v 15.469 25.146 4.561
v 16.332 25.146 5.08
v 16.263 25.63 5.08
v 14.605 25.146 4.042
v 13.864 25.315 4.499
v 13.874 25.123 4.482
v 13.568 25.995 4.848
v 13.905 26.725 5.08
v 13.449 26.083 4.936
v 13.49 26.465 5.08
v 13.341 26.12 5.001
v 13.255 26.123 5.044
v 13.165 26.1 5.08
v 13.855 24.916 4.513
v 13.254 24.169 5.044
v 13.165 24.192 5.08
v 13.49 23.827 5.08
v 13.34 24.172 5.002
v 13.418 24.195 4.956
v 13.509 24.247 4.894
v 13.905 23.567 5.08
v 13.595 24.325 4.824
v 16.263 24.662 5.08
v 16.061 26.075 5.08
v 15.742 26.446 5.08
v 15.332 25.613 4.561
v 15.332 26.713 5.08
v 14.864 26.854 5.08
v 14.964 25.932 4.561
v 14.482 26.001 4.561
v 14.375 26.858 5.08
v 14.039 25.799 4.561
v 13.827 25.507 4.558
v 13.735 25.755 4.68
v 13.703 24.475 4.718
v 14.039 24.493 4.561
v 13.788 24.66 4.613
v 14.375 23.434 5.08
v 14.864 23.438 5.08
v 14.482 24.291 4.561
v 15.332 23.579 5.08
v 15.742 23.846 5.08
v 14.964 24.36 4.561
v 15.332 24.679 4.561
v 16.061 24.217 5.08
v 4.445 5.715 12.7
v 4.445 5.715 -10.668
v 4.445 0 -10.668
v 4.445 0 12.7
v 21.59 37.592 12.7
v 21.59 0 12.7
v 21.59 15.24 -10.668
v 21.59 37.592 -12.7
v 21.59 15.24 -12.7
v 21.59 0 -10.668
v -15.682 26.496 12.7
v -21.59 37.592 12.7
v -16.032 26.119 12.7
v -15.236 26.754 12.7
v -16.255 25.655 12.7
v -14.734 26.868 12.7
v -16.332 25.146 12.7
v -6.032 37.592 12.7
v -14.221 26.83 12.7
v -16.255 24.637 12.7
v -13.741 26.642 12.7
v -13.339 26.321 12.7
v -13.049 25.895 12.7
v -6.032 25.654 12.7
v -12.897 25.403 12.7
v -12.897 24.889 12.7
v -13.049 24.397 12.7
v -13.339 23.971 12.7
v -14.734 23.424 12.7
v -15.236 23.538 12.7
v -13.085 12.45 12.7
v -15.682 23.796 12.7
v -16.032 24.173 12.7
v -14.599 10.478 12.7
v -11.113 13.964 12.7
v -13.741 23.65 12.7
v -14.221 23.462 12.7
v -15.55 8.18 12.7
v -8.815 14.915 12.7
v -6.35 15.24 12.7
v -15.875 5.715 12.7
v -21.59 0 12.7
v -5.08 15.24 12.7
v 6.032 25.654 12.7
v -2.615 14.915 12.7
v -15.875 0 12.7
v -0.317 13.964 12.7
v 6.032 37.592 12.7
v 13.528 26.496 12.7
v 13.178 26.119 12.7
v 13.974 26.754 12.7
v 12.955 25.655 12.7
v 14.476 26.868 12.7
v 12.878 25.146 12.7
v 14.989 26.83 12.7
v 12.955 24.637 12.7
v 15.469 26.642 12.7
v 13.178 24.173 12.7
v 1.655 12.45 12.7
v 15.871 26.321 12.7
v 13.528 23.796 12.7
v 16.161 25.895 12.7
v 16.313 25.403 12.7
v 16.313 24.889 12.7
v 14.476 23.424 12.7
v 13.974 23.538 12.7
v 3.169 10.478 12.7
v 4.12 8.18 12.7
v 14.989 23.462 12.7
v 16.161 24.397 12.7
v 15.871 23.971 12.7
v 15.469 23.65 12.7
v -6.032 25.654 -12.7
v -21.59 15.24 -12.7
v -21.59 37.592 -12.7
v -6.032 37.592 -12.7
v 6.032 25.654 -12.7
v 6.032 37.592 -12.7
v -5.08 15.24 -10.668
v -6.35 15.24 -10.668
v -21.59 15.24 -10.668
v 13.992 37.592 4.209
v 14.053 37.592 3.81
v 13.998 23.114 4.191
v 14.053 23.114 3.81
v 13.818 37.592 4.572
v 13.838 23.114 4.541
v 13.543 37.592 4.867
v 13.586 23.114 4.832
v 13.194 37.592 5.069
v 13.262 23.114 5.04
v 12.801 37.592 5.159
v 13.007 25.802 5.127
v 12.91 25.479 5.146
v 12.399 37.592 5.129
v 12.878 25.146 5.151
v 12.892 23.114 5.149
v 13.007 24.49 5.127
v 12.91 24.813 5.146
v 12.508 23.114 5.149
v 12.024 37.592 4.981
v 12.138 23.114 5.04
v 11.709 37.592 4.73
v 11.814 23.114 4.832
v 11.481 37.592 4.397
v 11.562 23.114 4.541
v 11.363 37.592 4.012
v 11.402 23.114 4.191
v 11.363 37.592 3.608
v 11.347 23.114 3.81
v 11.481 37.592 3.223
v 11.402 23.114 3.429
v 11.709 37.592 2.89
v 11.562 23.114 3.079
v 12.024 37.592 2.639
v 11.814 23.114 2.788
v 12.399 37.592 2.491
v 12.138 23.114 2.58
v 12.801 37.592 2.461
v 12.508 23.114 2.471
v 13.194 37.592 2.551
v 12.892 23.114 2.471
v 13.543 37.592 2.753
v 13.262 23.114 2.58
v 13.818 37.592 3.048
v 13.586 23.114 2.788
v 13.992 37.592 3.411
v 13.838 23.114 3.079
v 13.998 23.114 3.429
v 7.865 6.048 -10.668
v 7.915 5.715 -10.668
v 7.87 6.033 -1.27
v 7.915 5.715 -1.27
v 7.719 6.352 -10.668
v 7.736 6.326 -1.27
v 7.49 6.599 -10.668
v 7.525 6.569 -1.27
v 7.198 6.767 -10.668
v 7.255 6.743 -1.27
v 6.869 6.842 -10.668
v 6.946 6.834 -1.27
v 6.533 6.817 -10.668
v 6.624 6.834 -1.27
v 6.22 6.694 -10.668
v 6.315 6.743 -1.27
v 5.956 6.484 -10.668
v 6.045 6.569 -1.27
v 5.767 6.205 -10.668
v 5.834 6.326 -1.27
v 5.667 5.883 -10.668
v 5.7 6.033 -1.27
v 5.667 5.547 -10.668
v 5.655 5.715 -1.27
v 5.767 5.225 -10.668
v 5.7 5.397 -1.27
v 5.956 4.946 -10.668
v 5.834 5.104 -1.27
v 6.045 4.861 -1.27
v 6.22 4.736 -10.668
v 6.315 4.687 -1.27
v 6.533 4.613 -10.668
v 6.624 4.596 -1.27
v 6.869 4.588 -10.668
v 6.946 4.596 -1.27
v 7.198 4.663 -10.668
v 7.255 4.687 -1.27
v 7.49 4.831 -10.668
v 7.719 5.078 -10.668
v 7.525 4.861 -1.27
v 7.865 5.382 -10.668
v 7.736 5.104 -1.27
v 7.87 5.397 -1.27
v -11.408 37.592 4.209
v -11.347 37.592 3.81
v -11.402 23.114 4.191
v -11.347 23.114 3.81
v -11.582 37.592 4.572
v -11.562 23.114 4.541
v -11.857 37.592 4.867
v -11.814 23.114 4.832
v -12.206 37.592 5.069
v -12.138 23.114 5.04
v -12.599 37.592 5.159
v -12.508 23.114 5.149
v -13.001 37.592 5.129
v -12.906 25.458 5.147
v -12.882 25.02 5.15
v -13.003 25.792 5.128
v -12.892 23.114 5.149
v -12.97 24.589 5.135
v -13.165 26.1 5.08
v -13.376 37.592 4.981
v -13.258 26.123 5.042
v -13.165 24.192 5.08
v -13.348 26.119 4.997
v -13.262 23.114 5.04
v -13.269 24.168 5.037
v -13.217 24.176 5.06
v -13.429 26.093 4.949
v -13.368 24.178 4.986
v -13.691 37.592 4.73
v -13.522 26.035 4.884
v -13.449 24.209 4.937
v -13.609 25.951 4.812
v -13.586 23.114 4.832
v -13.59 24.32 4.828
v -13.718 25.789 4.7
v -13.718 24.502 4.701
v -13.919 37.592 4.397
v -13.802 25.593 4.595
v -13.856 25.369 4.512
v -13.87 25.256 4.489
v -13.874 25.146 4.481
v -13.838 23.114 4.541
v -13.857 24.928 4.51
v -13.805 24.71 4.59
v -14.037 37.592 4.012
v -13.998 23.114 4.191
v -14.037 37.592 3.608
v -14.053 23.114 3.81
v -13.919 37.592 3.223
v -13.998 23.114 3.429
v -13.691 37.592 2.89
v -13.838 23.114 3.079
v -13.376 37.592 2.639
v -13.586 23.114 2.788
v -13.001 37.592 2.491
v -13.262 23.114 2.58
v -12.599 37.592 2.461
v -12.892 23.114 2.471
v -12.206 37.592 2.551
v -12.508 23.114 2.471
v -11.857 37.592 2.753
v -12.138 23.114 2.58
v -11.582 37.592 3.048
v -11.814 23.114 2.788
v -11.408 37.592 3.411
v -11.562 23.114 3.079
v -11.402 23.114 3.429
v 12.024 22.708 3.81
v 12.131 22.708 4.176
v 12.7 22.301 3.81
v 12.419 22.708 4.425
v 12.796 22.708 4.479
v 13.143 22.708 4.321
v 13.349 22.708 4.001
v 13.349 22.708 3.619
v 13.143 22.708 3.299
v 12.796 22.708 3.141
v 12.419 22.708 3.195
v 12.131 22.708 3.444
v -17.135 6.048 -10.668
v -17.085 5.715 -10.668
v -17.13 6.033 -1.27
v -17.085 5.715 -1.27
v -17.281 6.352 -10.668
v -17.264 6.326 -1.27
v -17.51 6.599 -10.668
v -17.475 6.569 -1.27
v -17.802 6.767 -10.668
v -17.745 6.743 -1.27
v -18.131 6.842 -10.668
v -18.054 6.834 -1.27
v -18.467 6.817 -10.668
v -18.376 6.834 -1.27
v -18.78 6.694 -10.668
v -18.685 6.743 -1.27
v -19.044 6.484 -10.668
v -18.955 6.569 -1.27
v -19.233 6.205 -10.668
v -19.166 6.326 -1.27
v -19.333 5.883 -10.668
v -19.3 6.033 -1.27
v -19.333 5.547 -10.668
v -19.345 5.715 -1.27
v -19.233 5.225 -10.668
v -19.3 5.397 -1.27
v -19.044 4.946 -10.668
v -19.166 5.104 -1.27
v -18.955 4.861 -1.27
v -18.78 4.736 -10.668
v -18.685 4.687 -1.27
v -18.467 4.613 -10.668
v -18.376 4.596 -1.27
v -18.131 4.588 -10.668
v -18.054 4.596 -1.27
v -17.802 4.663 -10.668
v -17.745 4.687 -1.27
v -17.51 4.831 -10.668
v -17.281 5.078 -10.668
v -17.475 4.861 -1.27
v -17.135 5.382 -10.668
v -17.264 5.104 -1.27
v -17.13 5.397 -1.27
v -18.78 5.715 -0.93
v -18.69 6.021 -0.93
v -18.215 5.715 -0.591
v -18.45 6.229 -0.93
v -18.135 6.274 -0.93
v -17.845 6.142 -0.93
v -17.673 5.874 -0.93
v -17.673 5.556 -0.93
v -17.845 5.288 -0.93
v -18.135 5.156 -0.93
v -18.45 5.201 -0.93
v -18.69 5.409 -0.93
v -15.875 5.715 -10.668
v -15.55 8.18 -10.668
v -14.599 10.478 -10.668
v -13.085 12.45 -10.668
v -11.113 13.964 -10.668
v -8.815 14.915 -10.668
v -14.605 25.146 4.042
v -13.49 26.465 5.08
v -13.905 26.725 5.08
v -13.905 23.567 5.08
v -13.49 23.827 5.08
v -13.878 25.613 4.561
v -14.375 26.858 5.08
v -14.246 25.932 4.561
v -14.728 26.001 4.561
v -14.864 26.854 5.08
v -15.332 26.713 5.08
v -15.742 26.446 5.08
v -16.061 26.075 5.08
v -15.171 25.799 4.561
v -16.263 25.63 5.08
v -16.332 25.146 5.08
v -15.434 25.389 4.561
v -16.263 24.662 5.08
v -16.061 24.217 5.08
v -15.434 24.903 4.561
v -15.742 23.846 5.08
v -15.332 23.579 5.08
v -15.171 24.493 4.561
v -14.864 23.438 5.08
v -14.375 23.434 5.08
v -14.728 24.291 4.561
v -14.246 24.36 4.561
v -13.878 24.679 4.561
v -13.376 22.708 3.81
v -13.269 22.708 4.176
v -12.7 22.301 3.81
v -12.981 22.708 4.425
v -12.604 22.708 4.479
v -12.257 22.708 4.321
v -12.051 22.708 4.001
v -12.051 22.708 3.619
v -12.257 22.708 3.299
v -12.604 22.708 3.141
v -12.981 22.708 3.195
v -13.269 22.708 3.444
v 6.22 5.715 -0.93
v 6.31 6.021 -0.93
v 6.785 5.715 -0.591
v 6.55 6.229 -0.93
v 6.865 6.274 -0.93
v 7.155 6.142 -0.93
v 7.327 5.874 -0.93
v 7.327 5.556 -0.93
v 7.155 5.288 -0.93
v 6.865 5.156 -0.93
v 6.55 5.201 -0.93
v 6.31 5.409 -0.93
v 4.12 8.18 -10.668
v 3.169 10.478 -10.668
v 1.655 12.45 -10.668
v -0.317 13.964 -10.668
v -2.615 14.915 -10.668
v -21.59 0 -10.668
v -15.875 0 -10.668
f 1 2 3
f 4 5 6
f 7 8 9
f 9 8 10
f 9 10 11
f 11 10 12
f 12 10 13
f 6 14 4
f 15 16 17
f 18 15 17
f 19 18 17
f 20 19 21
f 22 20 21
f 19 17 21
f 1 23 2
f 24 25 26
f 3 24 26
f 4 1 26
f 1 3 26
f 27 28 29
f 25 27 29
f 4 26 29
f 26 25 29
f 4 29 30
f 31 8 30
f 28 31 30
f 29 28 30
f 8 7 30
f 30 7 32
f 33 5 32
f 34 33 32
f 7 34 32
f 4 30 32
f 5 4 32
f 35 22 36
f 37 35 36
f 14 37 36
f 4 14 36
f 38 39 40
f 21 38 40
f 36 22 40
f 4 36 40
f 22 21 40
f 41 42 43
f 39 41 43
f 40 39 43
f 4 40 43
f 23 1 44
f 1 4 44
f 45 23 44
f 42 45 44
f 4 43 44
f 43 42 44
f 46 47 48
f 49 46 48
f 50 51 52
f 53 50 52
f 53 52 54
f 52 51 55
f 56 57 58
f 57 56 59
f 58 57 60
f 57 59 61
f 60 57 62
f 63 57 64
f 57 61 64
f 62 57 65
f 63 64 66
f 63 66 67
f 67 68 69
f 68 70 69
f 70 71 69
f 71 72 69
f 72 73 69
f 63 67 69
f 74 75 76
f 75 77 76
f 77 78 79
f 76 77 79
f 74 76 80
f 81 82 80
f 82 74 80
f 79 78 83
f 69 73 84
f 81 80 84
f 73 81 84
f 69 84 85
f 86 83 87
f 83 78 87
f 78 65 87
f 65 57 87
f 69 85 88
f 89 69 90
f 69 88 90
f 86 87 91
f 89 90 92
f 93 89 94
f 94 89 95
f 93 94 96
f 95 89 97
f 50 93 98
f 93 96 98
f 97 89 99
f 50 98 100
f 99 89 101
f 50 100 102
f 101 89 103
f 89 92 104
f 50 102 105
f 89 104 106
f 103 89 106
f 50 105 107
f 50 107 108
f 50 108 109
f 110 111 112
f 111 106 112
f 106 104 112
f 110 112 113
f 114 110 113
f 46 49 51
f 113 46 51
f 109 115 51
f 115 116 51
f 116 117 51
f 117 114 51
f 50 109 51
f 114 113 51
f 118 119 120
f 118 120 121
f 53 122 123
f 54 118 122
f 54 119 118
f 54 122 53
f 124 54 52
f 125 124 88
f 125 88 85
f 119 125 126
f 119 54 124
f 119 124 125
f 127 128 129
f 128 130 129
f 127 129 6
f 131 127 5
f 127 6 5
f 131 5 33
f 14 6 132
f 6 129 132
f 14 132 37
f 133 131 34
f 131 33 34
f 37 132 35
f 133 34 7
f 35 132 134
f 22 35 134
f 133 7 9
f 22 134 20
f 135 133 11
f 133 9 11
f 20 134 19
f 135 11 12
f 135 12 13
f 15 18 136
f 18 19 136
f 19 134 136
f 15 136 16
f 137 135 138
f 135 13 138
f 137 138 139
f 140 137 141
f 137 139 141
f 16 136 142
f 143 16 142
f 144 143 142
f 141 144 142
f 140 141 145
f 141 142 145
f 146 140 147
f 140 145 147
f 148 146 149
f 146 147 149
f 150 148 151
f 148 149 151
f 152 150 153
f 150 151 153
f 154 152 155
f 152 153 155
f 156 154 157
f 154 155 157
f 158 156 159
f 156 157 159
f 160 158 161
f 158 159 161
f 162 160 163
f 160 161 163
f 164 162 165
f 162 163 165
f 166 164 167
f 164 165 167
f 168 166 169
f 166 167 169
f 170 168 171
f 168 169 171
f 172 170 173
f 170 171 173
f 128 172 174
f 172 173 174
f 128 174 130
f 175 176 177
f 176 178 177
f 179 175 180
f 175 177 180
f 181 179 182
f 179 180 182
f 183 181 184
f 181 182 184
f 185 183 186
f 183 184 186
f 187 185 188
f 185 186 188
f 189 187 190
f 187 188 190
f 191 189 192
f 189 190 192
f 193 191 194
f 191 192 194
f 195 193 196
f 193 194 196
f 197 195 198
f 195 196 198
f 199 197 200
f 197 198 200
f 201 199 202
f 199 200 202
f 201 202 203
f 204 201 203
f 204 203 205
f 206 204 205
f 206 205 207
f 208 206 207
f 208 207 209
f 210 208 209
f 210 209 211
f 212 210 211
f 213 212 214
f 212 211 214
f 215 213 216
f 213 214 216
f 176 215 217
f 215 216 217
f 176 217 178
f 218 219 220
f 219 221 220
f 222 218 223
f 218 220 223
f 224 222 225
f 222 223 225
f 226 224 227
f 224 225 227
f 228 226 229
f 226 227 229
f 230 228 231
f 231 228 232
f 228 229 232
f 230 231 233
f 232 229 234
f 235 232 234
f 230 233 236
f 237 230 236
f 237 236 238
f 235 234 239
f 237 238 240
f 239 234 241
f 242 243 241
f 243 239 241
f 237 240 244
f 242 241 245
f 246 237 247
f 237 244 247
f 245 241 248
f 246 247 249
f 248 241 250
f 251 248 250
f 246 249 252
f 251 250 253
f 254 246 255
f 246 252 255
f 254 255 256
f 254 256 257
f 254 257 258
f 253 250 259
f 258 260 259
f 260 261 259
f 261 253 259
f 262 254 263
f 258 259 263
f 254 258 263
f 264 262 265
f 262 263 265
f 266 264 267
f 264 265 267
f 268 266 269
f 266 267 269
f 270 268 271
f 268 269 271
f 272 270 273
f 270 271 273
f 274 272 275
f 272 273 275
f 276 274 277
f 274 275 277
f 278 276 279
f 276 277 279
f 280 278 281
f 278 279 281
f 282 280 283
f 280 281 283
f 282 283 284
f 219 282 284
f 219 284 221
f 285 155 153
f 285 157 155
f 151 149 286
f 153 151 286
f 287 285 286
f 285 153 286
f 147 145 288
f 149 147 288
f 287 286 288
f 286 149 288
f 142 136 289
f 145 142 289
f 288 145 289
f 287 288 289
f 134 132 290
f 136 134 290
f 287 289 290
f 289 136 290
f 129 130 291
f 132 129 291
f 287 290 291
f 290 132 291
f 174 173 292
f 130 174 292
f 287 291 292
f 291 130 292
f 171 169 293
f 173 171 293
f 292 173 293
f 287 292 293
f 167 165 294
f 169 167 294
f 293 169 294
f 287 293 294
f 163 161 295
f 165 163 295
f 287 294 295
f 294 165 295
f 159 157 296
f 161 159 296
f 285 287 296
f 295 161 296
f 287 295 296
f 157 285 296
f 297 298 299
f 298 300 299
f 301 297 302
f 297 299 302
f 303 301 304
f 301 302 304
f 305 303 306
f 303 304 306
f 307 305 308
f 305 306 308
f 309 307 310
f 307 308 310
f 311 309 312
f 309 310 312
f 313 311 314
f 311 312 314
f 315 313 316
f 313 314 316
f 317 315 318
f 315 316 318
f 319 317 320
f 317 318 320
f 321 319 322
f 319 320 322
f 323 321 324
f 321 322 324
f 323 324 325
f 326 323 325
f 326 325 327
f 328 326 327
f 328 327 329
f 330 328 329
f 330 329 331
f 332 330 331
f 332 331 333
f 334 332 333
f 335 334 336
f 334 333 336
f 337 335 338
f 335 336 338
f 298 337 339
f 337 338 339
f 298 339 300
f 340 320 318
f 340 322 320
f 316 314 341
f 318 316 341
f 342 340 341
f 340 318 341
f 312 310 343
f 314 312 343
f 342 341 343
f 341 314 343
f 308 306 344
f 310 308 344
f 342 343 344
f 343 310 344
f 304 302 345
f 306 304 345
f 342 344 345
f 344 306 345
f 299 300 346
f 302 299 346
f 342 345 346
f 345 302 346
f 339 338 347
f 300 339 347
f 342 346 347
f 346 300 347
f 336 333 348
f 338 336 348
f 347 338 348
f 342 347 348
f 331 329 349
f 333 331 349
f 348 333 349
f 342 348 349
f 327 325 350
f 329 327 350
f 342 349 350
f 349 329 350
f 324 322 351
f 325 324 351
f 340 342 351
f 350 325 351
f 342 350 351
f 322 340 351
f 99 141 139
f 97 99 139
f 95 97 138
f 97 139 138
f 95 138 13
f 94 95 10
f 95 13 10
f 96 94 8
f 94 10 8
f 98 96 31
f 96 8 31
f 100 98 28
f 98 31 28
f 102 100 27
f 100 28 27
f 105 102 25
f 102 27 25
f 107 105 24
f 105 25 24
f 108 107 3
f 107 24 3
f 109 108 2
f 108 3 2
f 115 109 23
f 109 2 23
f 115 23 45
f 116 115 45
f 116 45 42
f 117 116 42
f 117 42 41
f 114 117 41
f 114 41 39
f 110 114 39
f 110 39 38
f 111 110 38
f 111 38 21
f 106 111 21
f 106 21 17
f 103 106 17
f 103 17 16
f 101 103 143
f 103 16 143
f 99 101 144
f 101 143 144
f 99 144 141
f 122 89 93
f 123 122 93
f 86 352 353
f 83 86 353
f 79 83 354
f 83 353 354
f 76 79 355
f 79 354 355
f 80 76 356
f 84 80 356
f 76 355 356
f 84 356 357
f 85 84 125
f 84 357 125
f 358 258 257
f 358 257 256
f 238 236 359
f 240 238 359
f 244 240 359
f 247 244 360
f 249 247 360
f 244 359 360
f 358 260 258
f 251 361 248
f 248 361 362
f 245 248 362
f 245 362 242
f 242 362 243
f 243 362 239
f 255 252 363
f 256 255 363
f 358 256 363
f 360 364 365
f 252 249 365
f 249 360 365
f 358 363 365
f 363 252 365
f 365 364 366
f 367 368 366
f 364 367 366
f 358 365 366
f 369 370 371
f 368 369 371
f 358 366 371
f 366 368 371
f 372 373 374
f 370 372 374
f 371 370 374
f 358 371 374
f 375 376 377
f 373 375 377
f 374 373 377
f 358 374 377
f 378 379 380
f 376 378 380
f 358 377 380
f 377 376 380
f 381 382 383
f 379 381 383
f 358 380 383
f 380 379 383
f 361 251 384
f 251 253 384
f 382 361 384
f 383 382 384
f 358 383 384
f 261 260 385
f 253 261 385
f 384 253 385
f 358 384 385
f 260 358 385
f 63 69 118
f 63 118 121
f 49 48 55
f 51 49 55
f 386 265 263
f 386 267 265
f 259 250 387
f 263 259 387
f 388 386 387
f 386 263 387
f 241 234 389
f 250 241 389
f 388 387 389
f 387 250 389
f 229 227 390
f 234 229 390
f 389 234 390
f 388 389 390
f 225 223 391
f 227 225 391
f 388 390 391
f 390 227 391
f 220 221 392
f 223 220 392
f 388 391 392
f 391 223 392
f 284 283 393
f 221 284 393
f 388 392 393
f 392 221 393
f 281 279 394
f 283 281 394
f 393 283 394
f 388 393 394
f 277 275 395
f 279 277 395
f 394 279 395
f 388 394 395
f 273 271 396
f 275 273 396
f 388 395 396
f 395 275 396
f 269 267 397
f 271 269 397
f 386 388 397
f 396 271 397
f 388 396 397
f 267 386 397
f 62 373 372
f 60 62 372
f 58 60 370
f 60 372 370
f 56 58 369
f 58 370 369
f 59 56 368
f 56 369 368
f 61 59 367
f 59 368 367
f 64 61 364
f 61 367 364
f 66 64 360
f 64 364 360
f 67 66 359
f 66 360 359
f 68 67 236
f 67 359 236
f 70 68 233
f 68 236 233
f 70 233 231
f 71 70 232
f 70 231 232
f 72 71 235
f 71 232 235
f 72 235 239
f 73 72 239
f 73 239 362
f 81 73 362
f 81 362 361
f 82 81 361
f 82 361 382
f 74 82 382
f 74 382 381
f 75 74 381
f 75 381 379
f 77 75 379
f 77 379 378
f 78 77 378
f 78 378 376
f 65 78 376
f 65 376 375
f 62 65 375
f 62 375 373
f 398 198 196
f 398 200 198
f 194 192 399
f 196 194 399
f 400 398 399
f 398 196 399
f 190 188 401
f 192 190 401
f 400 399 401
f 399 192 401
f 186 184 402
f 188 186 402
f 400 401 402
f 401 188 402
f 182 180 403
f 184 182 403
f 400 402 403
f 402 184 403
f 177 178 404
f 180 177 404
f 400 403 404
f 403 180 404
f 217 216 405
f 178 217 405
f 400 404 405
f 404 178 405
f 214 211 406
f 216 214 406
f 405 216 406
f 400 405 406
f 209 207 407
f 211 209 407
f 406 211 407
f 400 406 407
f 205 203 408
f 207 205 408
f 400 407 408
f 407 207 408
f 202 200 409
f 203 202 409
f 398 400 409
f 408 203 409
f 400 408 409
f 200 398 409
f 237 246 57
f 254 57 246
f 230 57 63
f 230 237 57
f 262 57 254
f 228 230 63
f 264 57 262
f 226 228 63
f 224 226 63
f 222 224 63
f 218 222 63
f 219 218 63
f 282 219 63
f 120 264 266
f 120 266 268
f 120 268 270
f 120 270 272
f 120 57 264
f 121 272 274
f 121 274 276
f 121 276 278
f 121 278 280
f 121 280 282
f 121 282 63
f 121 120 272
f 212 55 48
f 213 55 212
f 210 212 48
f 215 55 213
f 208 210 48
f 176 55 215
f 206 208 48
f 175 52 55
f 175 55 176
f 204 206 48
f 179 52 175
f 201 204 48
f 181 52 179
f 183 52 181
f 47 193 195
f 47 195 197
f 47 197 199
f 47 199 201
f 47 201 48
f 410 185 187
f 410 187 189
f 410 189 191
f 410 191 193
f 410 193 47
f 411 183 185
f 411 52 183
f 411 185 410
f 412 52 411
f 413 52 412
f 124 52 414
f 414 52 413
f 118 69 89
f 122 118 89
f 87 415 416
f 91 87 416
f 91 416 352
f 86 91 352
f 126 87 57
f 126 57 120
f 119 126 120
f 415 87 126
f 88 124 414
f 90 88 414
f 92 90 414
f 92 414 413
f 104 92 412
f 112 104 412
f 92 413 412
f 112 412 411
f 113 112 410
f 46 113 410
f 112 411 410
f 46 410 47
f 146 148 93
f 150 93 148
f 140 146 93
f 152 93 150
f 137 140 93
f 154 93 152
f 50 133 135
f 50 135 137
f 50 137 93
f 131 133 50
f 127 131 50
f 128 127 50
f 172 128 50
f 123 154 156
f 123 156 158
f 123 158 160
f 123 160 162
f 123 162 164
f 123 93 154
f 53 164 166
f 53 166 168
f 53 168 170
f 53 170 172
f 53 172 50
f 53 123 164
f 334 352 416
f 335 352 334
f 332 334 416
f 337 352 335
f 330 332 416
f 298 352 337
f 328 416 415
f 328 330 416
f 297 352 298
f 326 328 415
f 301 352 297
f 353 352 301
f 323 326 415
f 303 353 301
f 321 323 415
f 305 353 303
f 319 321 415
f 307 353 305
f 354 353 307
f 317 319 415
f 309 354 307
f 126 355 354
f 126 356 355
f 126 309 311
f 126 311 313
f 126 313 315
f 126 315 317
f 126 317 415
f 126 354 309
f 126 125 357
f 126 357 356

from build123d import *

# Parameters (mm, degrees)
SKETCH1_W                 = 43.18
SKETCH1_H                 = 25.4
BASE_DEPTH                = 37.592
SKETCH2_W                 = 12.065
SKETCH2_H                 = 11.938
LINACTSLOT_DEPTH          = 51.24387091
MOUTINGHOLES_D            = 2.7051
MOUTINGHOLES_DEPTH        = 14.478
MOUTINGHOLES_TIP          = 0.81269403
MOTORSLOT_DEPTH           = 51.24387091
MOTORMOUNTINGHOLES2_D     = 2.2606
MOTORMOUNTINGHOLES2_DEPTH = 11.43
MOTORMOUNTINGHOLES2_TIP   = 0.679152758
F_8_32_TAPPED_HOLE1_D     = 3.4544
F_8_32_TAPPED_HOLE1_DEPTH = 7.62
F_8_32_TAPPED_HOLE1_TIP   = 1.037806461
SKETCH23_W                = 43.18
SKETCH23_H                = 15.24
CUT_EXTRUDE1_DEPTH        = 2.032


with BuildPart() as part:
    # Sketch1 → Base (new body)
    with BuildSketch(Plane(origin=(0, 0, 0), x_dir=(1, 0, 0), z_dir=(0, 1, 0))):
        Rectangle(SKETCH1_W, SKETCH1_H)
    extrude(amount=BASE_DEPTH)

    # Sketch2 → LinActSlot (cut, through all)
    with BuildSketch(Plane.XY.offset(12.7)):
        with Locations((0, 31.623)):
            Rectangle(SKETCH2_W, SKETCH2_H)
    extrude(amount=-LINACTSLOT_DEPTH, mode=Mode.SUBTRACT)

    # MoutingHoles
    with Locations(Plane(origin=(14.160350453, 37.592, 8.373414988), x_dir=(-1, 0, 0), z_dir=(0, 1, 0))):
        with Locations((1.460350453, -4.563414988), (26.860350453, -4.563414988)):
            Hole(MOUTINGHOLES_D / 2, depth=MOUTINGHOLES_DEPTH)
            with Locations((0, 0, -(MOUTINGHOLES_DEPTH + MOUTINGHOLES_TIP / 2))):  # 118° drill point
                Cone(0, MOUTINGHOLES_D / 2, MOUTINGHOLES_TIP, mode=Mode.SUBTRACT)

    # Sketch11 → MotorSlot (cut, through all)
    with BuildSketch(Plane(origin=(0, 0, -12.7), x_dir=(-1, 0, 0), z_dir=(0, 0, -1))):
        with BuildLine():
            Line((15.875, 5.08), (15.875, 5.715))
            ThreePointArc((15.875, 5.715), (13.085192091, 12.450192091), (6.35, 15.24))
            Line((6.35, 15.24), (5.08, 15.24))
            ThreePointArc((5.08, 15.24), (-1.655192091, 12.450192091), (-4.445, 5.715))
            Line((-4.445, 5.715), (-4.445, 5.08))
            Line((-4.445, 5.08), (-4.445, 0))
            Line((-4.445, 0), (15.875, 0))
            Line((15.875, 0), (15.875, 5.08))
        make_face()
    extrude(amount=-MOTORSLOT_DEPTH, mode=Mode.SUBTRACT)

    # MotorMountingHoles2
    with Locations(Plane(origin=(0, 0, -12.7), x_dir=(-1, 0, 0), z_dir=(0, 0, -1))):
        with Locations((18.215, 5.715), (-6.785, 5.715)):
            Hole(MOTORMOUNTINGHOLES2_D / 2, depth=MOTORMOUNTINGHOLES2_DEPTH)
            with Locations((0, 0, -(MOTORMOUNTINGHOLES2_DEPTH + MOTORMOUNTINGHOLES2_TIP / 2))):  # 118° drill point
                Cone(0, MOTORMOUNTINGHOLES2_D / 2, MOTORMOUNTINGHOLES2_TIP, mode=Mode.SUBTRACT)

    # #8-32 Tapped Hole1
    with Locations(Plane.XY.offset(12.7)):
        with Locations((-14.605, 25.146), (14.605, 25.146)):
            Hole(F_8_32_TAPPED_HOLE1_D / 2, depth=F_8_32_TAPPED_HOLE1_DEPTH)
            with Locations((0, 0, -(F_8_32_TAPPED_HOLE1_DEPTH + F_8_32_TAPPED_HOLE1_TIP / 2))):  # 118° drill point
                Cone(0, F_8_32_TAPPED_HOLE1_D / 2, F_8_32_TAPPED_HOLE1_TIP, mode=Mode.SUBTRACT)

    # Sketch23 → Cut-Extrude1 (cut)
    with BuildSketch(Plane(origin=(0, 0, -12.7), x_dir=(-1, 0, 0), z_dir=(0, 0, -1))):
        with Locations((0, 7.62)):
            Rectangle(SKETCH23_W, SKETCH23_H)
    extrude(amount=-CUT_EXTRUDE1_DEPTH, mode=Mode.SUBTRACT)


solid = part.part
